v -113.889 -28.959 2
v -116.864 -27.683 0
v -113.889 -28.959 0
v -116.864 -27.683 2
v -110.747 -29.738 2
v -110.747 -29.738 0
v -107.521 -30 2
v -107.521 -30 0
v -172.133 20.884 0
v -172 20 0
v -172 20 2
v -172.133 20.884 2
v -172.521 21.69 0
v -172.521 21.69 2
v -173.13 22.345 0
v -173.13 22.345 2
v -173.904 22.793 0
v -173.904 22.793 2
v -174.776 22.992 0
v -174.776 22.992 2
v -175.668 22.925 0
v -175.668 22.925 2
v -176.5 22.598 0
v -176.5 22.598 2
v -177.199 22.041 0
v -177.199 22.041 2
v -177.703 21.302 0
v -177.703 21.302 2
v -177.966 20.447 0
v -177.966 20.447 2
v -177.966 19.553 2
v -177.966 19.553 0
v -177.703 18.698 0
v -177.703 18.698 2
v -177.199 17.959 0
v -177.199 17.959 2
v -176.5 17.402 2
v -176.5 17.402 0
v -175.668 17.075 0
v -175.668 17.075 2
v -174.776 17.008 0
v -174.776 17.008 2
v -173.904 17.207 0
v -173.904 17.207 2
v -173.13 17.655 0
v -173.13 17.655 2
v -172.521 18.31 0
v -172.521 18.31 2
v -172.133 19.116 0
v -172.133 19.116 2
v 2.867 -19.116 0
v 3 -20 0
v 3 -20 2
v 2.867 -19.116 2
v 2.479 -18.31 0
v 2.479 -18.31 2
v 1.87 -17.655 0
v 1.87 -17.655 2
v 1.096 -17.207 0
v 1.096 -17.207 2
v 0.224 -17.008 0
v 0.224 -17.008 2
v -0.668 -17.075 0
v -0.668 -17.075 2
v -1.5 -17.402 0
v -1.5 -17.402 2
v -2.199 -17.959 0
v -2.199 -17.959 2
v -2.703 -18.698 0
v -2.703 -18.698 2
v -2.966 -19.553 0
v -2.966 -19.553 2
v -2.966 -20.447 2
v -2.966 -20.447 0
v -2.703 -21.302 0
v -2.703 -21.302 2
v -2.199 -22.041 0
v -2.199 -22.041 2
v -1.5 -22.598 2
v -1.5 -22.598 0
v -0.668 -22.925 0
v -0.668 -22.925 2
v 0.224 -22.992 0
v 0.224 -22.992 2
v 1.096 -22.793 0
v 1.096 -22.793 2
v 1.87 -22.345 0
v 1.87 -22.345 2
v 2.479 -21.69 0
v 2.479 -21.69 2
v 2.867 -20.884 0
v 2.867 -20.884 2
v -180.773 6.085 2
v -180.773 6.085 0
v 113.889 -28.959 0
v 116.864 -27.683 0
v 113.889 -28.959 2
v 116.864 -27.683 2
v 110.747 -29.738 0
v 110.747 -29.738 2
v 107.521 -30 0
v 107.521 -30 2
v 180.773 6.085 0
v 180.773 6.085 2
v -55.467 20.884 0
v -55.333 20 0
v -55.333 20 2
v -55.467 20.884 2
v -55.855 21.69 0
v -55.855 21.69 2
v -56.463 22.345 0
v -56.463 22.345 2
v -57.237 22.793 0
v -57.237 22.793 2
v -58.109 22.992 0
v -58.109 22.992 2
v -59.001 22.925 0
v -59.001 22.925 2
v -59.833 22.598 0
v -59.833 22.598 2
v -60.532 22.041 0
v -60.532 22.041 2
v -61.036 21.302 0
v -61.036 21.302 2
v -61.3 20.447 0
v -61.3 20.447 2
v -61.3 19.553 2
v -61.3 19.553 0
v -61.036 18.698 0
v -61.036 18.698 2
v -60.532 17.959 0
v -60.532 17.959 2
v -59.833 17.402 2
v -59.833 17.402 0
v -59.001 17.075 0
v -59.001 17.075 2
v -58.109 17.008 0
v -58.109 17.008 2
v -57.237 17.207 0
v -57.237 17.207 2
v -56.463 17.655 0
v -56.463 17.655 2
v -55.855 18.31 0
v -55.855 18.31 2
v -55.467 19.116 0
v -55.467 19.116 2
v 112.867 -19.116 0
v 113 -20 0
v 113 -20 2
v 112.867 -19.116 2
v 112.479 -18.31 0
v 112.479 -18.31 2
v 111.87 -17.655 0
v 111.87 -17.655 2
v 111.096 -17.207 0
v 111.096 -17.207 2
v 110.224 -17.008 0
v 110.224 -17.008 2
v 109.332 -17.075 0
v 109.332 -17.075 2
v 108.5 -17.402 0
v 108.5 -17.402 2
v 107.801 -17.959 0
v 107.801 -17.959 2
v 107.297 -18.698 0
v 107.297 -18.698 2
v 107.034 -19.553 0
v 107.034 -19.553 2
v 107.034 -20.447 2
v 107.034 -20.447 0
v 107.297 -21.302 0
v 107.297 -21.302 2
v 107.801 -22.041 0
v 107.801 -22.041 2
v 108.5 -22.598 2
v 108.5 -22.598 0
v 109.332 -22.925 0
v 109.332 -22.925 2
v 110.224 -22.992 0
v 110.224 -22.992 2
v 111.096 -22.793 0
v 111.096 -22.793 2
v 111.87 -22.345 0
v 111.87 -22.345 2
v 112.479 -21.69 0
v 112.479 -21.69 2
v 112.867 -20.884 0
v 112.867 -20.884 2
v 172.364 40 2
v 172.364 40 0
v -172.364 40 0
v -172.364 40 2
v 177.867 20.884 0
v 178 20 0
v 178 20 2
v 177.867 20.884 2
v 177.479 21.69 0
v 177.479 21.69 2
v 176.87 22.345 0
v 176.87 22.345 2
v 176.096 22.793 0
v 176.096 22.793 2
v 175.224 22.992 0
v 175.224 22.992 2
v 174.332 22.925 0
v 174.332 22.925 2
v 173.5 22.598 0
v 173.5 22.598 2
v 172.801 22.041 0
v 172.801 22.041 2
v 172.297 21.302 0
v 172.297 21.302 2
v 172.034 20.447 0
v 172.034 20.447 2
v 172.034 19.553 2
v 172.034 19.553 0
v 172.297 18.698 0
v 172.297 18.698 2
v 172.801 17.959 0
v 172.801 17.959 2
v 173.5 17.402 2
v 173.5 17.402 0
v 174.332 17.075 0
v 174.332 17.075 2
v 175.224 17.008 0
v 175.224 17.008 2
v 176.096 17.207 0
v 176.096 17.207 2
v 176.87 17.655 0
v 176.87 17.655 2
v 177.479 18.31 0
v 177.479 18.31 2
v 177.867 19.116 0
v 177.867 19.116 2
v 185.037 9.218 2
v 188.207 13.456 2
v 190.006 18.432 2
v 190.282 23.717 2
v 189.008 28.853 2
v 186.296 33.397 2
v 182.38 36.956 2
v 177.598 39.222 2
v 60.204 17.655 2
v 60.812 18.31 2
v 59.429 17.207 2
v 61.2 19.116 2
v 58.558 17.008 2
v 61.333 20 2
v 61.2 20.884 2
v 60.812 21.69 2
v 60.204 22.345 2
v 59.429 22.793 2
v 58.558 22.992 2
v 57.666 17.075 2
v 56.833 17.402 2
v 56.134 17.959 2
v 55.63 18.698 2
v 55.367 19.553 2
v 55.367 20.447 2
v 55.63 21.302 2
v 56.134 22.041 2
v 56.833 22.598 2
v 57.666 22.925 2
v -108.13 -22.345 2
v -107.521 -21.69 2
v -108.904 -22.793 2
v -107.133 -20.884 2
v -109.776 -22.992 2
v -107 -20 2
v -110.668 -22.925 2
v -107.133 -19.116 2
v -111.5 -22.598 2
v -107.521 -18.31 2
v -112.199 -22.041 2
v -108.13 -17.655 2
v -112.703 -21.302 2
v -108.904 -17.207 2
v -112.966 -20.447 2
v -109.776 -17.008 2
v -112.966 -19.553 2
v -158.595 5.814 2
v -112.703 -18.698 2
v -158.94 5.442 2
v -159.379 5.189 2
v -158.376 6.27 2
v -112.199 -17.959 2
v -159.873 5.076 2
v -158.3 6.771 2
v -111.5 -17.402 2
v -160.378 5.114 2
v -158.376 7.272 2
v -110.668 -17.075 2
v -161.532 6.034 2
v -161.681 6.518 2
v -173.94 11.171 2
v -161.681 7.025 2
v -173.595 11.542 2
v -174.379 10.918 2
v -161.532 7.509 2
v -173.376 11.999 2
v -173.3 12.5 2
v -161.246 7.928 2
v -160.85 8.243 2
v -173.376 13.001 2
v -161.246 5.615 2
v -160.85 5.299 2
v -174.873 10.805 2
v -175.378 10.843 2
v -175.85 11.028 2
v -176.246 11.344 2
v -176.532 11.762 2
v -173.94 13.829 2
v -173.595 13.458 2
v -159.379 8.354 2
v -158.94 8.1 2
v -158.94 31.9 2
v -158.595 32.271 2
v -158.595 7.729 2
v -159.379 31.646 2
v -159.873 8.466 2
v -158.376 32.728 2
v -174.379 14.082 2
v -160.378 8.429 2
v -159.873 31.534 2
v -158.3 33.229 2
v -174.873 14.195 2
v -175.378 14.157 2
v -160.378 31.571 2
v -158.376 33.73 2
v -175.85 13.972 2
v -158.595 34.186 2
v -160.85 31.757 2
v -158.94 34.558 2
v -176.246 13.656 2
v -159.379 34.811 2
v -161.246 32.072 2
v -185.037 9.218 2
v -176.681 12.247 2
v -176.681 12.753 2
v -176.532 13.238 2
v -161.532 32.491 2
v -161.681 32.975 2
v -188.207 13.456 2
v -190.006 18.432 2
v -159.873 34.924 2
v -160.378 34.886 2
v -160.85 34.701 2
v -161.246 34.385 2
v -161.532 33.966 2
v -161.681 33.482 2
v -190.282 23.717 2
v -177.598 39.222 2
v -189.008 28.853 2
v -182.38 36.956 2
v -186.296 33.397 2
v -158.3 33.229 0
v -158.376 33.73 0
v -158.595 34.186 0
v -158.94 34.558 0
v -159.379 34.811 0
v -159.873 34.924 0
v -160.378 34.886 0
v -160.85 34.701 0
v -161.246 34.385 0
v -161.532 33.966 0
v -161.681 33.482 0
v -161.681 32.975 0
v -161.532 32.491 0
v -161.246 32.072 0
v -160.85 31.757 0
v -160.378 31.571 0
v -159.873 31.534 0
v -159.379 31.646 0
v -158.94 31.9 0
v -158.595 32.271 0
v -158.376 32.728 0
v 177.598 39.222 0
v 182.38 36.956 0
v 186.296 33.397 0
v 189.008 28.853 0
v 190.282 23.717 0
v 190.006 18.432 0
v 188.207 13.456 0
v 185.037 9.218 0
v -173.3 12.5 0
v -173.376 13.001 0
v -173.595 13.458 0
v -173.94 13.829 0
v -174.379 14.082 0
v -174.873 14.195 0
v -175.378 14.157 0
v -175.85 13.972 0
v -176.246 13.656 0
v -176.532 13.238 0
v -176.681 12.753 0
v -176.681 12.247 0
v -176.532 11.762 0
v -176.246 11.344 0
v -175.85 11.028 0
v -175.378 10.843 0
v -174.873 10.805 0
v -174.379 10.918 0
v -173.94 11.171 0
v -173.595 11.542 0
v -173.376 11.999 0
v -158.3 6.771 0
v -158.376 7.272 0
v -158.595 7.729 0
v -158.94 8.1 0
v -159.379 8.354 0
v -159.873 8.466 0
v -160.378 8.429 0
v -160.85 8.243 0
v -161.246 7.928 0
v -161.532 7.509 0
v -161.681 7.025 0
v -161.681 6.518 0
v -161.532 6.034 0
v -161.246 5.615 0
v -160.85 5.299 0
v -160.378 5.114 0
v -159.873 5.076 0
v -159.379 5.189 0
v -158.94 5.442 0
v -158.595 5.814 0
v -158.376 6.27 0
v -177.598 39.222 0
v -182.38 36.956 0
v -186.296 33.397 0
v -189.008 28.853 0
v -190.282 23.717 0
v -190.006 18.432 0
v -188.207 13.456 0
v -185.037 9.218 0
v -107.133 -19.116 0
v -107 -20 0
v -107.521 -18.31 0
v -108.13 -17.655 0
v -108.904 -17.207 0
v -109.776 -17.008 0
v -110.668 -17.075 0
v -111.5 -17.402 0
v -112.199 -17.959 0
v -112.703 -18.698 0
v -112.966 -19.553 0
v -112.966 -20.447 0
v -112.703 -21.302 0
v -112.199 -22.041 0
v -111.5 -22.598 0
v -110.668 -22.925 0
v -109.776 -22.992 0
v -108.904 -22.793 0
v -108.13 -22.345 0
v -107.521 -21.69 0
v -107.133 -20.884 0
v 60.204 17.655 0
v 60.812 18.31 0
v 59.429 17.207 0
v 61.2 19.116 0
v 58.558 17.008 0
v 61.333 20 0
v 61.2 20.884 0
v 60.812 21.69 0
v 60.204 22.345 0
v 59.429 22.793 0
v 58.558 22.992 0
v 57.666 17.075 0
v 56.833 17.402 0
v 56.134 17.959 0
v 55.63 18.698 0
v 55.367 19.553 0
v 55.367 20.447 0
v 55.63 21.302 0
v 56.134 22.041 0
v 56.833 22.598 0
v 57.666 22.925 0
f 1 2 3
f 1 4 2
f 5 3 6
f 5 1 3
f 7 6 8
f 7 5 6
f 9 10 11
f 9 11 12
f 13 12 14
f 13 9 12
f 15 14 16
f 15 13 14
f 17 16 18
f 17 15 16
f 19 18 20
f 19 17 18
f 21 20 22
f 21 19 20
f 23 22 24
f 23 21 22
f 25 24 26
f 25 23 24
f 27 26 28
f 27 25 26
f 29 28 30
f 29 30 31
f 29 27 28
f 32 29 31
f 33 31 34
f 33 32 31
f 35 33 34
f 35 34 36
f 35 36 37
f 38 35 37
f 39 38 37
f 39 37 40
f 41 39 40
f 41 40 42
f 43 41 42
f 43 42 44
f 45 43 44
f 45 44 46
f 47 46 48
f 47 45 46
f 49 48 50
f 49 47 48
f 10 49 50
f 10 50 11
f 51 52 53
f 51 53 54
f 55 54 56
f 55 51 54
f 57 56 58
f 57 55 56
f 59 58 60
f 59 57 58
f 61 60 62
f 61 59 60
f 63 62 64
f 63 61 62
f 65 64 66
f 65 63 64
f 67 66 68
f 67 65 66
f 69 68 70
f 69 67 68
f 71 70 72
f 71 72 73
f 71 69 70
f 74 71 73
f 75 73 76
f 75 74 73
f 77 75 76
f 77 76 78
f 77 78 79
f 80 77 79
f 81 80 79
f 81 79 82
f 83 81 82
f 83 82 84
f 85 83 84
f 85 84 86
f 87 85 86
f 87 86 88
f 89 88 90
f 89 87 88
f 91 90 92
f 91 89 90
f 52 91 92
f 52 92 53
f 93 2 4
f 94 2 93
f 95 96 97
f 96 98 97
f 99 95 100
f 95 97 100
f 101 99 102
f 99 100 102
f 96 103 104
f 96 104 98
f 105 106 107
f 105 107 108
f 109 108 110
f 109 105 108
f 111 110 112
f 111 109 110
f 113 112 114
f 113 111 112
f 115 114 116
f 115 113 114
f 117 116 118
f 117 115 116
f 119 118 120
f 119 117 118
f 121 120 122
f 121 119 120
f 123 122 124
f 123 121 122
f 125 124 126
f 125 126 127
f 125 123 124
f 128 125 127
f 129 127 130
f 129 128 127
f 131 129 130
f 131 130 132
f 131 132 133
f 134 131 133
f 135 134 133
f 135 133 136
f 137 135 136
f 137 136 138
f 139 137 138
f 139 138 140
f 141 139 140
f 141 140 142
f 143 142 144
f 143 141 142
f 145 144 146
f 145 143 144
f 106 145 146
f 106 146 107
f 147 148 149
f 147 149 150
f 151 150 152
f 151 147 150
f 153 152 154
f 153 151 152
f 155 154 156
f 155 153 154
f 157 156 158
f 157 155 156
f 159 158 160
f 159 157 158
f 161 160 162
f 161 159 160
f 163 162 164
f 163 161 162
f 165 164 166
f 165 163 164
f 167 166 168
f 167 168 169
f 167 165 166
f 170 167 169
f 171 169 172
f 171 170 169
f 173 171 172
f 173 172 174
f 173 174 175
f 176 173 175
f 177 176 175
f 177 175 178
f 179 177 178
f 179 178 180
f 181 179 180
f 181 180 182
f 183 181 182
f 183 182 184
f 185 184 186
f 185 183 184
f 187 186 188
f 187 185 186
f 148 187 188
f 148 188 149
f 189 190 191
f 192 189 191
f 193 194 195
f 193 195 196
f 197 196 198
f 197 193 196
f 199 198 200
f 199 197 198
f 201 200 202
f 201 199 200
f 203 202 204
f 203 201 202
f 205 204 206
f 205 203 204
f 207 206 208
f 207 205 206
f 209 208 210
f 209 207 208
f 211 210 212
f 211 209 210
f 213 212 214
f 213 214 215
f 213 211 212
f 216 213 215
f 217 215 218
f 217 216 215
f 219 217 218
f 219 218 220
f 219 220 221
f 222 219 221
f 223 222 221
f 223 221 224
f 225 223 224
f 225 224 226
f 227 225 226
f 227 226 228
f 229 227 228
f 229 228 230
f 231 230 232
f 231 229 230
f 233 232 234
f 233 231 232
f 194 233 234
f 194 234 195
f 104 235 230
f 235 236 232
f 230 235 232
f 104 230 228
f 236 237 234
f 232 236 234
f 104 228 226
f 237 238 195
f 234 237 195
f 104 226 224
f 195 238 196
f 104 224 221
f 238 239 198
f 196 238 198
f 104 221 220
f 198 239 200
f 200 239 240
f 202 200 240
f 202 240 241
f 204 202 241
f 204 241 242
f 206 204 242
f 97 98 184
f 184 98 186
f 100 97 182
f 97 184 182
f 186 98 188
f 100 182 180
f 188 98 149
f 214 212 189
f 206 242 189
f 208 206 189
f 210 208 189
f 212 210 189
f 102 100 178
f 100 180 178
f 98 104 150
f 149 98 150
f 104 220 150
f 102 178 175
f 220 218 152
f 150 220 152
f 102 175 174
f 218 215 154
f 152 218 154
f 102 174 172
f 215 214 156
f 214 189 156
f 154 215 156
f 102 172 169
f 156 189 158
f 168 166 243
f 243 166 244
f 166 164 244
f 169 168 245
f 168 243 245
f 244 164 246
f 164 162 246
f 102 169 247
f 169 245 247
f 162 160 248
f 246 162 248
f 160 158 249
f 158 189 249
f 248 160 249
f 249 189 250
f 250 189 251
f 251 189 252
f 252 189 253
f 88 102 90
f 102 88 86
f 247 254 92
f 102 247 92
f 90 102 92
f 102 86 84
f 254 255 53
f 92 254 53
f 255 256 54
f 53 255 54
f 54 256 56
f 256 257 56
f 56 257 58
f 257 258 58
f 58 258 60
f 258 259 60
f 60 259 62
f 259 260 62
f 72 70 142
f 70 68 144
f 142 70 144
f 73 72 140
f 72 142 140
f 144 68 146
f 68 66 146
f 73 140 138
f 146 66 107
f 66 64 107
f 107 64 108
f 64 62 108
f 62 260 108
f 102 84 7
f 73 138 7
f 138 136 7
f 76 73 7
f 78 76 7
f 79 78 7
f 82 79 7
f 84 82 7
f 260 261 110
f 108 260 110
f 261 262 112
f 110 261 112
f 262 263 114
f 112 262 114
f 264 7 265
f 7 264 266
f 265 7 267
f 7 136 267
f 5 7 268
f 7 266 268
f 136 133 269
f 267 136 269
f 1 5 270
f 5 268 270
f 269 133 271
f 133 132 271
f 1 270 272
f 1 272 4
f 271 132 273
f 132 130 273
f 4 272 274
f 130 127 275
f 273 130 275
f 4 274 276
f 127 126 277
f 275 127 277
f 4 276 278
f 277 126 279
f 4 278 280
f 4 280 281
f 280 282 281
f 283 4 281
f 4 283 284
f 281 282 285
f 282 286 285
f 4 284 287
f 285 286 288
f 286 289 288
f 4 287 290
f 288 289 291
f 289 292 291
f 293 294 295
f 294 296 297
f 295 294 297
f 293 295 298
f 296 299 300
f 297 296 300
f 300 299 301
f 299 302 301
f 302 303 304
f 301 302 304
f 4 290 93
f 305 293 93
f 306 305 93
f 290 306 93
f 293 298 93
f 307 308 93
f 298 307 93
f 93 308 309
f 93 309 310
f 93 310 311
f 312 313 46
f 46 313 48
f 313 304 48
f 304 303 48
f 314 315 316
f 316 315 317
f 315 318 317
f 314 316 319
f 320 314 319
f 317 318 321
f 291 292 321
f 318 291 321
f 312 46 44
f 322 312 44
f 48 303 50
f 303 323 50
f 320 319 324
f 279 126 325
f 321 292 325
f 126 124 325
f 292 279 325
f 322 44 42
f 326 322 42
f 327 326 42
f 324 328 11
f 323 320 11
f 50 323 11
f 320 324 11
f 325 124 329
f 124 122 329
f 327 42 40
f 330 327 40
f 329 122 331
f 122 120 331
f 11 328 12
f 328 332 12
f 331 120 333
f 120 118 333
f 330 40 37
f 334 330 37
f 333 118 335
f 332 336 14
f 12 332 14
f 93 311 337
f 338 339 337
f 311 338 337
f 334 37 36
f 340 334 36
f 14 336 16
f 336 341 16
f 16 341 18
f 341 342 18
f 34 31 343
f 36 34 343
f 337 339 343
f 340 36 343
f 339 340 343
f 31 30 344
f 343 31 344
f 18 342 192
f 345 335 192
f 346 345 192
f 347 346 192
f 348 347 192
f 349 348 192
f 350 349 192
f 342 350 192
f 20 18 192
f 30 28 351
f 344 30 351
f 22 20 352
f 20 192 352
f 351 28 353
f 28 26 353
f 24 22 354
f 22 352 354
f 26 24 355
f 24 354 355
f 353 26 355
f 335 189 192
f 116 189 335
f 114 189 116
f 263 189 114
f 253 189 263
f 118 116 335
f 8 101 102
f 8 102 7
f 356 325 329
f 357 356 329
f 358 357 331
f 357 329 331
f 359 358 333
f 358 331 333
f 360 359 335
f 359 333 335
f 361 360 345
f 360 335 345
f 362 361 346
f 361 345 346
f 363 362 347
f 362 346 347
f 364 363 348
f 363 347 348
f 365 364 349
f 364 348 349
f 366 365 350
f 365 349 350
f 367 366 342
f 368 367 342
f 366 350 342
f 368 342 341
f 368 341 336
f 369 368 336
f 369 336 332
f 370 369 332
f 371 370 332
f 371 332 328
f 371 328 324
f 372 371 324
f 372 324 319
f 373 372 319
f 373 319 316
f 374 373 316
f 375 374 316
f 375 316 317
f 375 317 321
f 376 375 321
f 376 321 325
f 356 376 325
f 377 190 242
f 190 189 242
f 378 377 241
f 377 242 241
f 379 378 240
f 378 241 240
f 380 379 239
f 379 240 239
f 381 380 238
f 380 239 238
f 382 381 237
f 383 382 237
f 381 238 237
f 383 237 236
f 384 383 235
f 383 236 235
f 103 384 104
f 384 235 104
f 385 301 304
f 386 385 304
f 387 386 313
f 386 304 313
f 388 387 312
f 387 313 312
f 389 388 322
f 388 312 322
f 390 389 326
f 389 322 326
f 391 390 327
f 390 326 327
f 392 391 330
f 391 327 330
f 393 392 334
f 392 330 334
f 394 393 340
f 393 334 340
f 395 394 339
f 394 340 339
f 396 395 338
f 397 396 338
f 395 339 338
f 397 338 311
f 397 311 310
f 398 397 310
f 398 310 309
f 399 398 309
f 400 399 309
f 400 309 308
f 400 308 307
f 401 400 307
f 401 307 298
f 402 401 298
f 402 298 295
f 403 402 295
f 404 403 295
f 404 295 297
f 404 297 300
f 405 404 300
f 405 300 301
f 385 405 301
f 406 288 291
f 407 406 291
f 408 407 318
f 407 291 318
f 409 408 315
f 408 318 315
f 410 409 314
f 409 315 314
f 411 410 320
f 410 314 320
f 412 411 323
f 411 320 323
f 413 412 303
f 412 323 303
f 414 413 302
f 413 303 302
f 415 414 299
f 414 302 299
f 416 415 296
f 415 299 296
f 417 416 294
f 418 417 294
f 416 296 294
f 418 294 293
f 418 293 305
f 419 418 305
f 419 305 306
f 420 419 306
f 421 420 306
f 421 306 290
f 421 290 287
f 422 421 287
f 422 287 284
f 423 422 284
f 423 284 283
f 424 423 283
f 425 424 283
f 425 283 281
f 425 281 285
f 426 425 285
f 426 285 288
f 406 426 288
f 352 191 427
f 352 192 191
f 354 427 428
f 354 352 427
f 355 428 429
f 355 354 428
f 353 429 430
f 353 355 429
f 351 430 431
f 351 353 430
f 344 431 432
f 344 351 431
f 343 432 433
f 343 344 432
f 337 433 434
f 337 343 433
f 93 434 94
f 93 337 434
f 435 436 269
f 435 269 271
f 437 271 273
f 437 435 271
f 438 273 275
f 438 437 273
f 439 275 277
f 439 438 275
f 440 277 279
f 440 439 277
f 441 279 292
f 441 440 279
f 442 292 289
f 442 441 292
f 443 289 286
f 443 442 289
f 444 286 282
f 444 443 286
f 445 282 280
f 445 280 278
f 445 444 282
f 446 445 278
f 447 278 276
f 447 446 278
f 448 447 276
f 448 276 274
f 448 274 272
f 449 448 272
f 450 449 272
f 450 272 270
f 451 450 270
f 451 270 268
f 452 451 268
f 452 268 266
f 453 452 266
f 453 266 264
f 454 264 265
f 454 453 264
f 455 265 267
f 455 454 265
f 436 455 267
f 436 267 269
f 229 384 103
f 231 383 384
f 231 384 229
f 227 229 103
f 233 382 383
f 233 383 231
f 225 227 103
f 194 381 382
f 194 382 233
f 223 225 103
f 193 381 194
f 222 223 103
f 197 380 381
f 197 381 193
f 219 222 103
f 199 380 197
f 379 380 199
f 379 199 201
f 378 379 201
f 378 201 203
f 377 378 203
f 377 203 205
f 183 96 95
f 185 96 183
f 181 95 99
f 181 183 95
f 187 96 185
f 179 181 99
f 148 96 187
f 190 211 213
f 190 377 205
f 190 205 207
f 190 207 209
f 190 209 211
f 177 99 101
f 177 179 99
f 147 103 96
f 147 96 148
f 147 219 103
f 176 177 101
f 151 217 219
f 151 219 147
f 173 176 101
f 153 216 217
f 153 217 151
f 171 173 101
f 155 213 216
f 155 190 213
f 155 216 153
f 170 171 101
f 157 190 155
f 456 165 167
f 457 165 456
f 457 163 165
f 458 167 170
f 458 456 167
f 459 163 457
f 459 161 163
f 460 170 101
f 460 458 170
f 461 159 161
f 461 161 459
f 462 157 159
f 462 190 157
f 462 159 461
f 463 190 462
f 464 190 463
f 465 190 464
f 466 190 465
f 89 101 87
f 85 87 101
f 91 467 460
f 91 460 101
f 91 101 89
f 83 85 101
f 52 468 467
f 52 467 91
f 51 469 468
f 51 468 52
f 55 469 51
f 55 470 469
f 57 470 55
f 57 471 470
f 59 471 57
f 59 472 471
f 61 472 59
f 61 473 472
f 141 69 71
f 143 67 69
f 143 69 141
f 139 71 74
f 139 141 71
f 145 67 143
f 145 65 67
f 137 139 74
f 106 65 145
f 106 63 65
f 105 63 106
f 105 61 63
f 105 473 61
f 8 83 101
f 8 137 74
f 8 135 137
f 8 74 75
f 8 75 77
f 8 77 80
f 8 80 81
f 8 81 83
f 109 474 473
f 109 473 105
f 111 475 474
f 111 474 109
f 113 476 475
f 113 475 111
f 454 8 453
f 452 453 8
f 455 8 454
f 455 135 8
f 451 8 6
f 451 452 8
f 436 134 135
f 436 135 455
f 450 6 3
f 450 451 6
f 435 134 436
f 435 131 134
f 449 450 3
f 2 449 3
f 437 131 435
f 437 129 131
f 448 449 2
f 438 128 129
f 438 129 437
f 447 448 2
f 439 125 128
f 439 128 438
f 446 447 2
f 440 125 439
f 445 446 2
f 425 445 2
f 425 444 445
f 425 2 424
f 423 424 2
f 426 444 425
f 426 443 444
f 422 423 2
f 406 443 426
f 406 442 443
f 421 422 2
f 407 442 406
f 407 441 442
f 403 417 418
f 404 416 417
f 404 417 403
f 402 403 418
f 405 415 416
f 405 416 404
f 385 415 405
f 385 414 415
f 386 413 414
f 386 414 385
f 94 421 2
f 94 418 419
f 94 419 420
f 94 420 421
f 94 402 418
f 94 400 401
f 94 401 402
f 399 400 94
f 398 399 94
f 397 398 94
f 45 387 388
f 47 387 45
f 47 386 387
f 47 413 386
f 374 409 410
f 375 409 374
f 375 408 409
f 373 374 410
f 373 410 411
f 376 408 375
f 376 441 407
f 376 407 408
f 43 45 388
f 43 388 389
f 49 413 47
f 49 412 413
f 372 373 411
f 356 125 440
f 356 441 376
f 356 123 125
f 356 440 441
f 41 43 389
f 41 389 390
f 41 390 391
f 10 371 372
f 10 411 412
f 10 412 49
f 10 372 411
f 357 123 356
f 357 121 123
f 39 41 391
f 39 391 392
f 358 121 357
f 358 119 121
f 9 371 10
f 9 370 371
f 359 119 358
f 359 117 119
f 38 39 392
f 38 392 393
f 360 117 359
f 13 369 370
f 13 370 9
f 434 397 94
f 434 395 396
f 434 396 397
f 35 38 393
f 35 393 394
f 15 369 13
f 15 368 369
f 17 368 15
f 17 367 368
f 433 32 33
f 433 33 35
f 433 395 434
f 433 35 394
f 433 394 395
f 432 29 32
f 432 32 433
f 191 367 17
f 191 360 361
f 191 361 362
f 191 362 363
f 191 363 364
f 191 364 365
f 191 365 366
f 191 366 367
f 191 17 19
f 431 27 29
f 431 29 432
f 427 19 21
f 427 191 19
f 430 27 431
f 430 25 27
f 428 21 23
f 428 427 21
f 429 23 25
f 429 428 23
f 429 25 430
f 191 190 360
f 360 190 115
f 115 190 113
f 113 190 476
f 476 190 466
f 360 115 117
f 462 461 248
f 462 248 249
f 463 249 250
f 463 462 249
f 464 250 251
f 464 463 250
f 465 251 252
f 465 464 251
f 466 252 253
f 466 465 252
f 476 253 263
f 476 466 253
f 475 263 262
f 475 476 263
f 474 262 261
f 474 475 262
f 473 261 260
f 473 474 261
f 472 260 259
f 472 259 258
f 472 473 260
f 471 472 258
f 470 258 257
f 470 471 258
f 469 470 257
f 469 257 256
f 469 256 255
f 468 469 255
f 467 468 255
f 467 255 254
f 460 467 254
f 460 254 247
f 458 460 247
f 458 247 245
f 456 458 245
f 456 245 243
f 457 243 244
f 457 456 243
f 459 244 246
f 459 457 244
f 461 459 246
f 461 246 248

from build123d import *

# Parameters (mm, degrees)
ESQUISSE1_R        = 3
BOSS_EXTRU_1_DEPTH = 2
CONG_1_R           = 18
CONG_2_R           = 20
D_GAGEMENT_M31_D   = 3.4


with BuildPart() as part:
    # Esquisse1 → Boss.-Extru.1 (new body)
    with BuildSketch(Plane.XY):
        Polygon((-244.958991582, 40), (-110, 40), (110, 40), (244.958991582, 40), (112.479495791, -30), (-112.479495791, -30), align=None)
        with Locations((-175, 20)):
            Circle(ESQUISSE1_R, mode=Mode.SUBTRACT)
        with Locations((-110, -20)):
            Circle(ESQUISSE1_R, mode=Mode.SUBTRACT)
        with Locations((110, -20)):
            Circle(ESQUISSE1_R, mode=Mode.SUBTRACT)
        with Locations((175, 20)):
            Circle(ESQUISSE1_R, mode=Mode.SUBTRACT)
        with Locations((0, -20)):
            Circle(ESQUISSE1_R, mode=Mode.SUBTRACT)
        with Locations((-58.333333333, 20)):
            Circle(ESQUISSE1_R, mode=Mode.SUBTRACT)
        with Locations((58.333333333, 20)):
            Circle(ESQUISSE1_R, mode=Mode.SUBTRACT)
    extrude(amount=BOSS_EXTRU_1_DEPTH)

    # Congé1
    cong_1_edges = [part.edges().sort_by_distance(p)[0] for p in [
        (-244.958991582, 40, 1),
        (244.958991582, 40, 1),
    ]]
    fillet(cong_1_edges, radius=CONG_1_R)

    # Congé2
    cong_2_edges = [part.edges().sort_by_distance(p)[0] for p in [
        (112.479495791, -30, 1),
        (-112.479495791, -30, 1),
    ]]
    fillet(cong_2_edges, radius=CONG_2_R)

    # Dégagement M31 (through all)
    with Locations(Plane(origin=(0, 0, 0), x_dir=(-1, 0, 0), z_dir=(0, 0, -1))):
        with Locations((160, 33.228756555), (175, 12.5), (160, 6.771243445)):
            Hole(D_GAGEMENT_M31_D / 2)


solid = part.part
